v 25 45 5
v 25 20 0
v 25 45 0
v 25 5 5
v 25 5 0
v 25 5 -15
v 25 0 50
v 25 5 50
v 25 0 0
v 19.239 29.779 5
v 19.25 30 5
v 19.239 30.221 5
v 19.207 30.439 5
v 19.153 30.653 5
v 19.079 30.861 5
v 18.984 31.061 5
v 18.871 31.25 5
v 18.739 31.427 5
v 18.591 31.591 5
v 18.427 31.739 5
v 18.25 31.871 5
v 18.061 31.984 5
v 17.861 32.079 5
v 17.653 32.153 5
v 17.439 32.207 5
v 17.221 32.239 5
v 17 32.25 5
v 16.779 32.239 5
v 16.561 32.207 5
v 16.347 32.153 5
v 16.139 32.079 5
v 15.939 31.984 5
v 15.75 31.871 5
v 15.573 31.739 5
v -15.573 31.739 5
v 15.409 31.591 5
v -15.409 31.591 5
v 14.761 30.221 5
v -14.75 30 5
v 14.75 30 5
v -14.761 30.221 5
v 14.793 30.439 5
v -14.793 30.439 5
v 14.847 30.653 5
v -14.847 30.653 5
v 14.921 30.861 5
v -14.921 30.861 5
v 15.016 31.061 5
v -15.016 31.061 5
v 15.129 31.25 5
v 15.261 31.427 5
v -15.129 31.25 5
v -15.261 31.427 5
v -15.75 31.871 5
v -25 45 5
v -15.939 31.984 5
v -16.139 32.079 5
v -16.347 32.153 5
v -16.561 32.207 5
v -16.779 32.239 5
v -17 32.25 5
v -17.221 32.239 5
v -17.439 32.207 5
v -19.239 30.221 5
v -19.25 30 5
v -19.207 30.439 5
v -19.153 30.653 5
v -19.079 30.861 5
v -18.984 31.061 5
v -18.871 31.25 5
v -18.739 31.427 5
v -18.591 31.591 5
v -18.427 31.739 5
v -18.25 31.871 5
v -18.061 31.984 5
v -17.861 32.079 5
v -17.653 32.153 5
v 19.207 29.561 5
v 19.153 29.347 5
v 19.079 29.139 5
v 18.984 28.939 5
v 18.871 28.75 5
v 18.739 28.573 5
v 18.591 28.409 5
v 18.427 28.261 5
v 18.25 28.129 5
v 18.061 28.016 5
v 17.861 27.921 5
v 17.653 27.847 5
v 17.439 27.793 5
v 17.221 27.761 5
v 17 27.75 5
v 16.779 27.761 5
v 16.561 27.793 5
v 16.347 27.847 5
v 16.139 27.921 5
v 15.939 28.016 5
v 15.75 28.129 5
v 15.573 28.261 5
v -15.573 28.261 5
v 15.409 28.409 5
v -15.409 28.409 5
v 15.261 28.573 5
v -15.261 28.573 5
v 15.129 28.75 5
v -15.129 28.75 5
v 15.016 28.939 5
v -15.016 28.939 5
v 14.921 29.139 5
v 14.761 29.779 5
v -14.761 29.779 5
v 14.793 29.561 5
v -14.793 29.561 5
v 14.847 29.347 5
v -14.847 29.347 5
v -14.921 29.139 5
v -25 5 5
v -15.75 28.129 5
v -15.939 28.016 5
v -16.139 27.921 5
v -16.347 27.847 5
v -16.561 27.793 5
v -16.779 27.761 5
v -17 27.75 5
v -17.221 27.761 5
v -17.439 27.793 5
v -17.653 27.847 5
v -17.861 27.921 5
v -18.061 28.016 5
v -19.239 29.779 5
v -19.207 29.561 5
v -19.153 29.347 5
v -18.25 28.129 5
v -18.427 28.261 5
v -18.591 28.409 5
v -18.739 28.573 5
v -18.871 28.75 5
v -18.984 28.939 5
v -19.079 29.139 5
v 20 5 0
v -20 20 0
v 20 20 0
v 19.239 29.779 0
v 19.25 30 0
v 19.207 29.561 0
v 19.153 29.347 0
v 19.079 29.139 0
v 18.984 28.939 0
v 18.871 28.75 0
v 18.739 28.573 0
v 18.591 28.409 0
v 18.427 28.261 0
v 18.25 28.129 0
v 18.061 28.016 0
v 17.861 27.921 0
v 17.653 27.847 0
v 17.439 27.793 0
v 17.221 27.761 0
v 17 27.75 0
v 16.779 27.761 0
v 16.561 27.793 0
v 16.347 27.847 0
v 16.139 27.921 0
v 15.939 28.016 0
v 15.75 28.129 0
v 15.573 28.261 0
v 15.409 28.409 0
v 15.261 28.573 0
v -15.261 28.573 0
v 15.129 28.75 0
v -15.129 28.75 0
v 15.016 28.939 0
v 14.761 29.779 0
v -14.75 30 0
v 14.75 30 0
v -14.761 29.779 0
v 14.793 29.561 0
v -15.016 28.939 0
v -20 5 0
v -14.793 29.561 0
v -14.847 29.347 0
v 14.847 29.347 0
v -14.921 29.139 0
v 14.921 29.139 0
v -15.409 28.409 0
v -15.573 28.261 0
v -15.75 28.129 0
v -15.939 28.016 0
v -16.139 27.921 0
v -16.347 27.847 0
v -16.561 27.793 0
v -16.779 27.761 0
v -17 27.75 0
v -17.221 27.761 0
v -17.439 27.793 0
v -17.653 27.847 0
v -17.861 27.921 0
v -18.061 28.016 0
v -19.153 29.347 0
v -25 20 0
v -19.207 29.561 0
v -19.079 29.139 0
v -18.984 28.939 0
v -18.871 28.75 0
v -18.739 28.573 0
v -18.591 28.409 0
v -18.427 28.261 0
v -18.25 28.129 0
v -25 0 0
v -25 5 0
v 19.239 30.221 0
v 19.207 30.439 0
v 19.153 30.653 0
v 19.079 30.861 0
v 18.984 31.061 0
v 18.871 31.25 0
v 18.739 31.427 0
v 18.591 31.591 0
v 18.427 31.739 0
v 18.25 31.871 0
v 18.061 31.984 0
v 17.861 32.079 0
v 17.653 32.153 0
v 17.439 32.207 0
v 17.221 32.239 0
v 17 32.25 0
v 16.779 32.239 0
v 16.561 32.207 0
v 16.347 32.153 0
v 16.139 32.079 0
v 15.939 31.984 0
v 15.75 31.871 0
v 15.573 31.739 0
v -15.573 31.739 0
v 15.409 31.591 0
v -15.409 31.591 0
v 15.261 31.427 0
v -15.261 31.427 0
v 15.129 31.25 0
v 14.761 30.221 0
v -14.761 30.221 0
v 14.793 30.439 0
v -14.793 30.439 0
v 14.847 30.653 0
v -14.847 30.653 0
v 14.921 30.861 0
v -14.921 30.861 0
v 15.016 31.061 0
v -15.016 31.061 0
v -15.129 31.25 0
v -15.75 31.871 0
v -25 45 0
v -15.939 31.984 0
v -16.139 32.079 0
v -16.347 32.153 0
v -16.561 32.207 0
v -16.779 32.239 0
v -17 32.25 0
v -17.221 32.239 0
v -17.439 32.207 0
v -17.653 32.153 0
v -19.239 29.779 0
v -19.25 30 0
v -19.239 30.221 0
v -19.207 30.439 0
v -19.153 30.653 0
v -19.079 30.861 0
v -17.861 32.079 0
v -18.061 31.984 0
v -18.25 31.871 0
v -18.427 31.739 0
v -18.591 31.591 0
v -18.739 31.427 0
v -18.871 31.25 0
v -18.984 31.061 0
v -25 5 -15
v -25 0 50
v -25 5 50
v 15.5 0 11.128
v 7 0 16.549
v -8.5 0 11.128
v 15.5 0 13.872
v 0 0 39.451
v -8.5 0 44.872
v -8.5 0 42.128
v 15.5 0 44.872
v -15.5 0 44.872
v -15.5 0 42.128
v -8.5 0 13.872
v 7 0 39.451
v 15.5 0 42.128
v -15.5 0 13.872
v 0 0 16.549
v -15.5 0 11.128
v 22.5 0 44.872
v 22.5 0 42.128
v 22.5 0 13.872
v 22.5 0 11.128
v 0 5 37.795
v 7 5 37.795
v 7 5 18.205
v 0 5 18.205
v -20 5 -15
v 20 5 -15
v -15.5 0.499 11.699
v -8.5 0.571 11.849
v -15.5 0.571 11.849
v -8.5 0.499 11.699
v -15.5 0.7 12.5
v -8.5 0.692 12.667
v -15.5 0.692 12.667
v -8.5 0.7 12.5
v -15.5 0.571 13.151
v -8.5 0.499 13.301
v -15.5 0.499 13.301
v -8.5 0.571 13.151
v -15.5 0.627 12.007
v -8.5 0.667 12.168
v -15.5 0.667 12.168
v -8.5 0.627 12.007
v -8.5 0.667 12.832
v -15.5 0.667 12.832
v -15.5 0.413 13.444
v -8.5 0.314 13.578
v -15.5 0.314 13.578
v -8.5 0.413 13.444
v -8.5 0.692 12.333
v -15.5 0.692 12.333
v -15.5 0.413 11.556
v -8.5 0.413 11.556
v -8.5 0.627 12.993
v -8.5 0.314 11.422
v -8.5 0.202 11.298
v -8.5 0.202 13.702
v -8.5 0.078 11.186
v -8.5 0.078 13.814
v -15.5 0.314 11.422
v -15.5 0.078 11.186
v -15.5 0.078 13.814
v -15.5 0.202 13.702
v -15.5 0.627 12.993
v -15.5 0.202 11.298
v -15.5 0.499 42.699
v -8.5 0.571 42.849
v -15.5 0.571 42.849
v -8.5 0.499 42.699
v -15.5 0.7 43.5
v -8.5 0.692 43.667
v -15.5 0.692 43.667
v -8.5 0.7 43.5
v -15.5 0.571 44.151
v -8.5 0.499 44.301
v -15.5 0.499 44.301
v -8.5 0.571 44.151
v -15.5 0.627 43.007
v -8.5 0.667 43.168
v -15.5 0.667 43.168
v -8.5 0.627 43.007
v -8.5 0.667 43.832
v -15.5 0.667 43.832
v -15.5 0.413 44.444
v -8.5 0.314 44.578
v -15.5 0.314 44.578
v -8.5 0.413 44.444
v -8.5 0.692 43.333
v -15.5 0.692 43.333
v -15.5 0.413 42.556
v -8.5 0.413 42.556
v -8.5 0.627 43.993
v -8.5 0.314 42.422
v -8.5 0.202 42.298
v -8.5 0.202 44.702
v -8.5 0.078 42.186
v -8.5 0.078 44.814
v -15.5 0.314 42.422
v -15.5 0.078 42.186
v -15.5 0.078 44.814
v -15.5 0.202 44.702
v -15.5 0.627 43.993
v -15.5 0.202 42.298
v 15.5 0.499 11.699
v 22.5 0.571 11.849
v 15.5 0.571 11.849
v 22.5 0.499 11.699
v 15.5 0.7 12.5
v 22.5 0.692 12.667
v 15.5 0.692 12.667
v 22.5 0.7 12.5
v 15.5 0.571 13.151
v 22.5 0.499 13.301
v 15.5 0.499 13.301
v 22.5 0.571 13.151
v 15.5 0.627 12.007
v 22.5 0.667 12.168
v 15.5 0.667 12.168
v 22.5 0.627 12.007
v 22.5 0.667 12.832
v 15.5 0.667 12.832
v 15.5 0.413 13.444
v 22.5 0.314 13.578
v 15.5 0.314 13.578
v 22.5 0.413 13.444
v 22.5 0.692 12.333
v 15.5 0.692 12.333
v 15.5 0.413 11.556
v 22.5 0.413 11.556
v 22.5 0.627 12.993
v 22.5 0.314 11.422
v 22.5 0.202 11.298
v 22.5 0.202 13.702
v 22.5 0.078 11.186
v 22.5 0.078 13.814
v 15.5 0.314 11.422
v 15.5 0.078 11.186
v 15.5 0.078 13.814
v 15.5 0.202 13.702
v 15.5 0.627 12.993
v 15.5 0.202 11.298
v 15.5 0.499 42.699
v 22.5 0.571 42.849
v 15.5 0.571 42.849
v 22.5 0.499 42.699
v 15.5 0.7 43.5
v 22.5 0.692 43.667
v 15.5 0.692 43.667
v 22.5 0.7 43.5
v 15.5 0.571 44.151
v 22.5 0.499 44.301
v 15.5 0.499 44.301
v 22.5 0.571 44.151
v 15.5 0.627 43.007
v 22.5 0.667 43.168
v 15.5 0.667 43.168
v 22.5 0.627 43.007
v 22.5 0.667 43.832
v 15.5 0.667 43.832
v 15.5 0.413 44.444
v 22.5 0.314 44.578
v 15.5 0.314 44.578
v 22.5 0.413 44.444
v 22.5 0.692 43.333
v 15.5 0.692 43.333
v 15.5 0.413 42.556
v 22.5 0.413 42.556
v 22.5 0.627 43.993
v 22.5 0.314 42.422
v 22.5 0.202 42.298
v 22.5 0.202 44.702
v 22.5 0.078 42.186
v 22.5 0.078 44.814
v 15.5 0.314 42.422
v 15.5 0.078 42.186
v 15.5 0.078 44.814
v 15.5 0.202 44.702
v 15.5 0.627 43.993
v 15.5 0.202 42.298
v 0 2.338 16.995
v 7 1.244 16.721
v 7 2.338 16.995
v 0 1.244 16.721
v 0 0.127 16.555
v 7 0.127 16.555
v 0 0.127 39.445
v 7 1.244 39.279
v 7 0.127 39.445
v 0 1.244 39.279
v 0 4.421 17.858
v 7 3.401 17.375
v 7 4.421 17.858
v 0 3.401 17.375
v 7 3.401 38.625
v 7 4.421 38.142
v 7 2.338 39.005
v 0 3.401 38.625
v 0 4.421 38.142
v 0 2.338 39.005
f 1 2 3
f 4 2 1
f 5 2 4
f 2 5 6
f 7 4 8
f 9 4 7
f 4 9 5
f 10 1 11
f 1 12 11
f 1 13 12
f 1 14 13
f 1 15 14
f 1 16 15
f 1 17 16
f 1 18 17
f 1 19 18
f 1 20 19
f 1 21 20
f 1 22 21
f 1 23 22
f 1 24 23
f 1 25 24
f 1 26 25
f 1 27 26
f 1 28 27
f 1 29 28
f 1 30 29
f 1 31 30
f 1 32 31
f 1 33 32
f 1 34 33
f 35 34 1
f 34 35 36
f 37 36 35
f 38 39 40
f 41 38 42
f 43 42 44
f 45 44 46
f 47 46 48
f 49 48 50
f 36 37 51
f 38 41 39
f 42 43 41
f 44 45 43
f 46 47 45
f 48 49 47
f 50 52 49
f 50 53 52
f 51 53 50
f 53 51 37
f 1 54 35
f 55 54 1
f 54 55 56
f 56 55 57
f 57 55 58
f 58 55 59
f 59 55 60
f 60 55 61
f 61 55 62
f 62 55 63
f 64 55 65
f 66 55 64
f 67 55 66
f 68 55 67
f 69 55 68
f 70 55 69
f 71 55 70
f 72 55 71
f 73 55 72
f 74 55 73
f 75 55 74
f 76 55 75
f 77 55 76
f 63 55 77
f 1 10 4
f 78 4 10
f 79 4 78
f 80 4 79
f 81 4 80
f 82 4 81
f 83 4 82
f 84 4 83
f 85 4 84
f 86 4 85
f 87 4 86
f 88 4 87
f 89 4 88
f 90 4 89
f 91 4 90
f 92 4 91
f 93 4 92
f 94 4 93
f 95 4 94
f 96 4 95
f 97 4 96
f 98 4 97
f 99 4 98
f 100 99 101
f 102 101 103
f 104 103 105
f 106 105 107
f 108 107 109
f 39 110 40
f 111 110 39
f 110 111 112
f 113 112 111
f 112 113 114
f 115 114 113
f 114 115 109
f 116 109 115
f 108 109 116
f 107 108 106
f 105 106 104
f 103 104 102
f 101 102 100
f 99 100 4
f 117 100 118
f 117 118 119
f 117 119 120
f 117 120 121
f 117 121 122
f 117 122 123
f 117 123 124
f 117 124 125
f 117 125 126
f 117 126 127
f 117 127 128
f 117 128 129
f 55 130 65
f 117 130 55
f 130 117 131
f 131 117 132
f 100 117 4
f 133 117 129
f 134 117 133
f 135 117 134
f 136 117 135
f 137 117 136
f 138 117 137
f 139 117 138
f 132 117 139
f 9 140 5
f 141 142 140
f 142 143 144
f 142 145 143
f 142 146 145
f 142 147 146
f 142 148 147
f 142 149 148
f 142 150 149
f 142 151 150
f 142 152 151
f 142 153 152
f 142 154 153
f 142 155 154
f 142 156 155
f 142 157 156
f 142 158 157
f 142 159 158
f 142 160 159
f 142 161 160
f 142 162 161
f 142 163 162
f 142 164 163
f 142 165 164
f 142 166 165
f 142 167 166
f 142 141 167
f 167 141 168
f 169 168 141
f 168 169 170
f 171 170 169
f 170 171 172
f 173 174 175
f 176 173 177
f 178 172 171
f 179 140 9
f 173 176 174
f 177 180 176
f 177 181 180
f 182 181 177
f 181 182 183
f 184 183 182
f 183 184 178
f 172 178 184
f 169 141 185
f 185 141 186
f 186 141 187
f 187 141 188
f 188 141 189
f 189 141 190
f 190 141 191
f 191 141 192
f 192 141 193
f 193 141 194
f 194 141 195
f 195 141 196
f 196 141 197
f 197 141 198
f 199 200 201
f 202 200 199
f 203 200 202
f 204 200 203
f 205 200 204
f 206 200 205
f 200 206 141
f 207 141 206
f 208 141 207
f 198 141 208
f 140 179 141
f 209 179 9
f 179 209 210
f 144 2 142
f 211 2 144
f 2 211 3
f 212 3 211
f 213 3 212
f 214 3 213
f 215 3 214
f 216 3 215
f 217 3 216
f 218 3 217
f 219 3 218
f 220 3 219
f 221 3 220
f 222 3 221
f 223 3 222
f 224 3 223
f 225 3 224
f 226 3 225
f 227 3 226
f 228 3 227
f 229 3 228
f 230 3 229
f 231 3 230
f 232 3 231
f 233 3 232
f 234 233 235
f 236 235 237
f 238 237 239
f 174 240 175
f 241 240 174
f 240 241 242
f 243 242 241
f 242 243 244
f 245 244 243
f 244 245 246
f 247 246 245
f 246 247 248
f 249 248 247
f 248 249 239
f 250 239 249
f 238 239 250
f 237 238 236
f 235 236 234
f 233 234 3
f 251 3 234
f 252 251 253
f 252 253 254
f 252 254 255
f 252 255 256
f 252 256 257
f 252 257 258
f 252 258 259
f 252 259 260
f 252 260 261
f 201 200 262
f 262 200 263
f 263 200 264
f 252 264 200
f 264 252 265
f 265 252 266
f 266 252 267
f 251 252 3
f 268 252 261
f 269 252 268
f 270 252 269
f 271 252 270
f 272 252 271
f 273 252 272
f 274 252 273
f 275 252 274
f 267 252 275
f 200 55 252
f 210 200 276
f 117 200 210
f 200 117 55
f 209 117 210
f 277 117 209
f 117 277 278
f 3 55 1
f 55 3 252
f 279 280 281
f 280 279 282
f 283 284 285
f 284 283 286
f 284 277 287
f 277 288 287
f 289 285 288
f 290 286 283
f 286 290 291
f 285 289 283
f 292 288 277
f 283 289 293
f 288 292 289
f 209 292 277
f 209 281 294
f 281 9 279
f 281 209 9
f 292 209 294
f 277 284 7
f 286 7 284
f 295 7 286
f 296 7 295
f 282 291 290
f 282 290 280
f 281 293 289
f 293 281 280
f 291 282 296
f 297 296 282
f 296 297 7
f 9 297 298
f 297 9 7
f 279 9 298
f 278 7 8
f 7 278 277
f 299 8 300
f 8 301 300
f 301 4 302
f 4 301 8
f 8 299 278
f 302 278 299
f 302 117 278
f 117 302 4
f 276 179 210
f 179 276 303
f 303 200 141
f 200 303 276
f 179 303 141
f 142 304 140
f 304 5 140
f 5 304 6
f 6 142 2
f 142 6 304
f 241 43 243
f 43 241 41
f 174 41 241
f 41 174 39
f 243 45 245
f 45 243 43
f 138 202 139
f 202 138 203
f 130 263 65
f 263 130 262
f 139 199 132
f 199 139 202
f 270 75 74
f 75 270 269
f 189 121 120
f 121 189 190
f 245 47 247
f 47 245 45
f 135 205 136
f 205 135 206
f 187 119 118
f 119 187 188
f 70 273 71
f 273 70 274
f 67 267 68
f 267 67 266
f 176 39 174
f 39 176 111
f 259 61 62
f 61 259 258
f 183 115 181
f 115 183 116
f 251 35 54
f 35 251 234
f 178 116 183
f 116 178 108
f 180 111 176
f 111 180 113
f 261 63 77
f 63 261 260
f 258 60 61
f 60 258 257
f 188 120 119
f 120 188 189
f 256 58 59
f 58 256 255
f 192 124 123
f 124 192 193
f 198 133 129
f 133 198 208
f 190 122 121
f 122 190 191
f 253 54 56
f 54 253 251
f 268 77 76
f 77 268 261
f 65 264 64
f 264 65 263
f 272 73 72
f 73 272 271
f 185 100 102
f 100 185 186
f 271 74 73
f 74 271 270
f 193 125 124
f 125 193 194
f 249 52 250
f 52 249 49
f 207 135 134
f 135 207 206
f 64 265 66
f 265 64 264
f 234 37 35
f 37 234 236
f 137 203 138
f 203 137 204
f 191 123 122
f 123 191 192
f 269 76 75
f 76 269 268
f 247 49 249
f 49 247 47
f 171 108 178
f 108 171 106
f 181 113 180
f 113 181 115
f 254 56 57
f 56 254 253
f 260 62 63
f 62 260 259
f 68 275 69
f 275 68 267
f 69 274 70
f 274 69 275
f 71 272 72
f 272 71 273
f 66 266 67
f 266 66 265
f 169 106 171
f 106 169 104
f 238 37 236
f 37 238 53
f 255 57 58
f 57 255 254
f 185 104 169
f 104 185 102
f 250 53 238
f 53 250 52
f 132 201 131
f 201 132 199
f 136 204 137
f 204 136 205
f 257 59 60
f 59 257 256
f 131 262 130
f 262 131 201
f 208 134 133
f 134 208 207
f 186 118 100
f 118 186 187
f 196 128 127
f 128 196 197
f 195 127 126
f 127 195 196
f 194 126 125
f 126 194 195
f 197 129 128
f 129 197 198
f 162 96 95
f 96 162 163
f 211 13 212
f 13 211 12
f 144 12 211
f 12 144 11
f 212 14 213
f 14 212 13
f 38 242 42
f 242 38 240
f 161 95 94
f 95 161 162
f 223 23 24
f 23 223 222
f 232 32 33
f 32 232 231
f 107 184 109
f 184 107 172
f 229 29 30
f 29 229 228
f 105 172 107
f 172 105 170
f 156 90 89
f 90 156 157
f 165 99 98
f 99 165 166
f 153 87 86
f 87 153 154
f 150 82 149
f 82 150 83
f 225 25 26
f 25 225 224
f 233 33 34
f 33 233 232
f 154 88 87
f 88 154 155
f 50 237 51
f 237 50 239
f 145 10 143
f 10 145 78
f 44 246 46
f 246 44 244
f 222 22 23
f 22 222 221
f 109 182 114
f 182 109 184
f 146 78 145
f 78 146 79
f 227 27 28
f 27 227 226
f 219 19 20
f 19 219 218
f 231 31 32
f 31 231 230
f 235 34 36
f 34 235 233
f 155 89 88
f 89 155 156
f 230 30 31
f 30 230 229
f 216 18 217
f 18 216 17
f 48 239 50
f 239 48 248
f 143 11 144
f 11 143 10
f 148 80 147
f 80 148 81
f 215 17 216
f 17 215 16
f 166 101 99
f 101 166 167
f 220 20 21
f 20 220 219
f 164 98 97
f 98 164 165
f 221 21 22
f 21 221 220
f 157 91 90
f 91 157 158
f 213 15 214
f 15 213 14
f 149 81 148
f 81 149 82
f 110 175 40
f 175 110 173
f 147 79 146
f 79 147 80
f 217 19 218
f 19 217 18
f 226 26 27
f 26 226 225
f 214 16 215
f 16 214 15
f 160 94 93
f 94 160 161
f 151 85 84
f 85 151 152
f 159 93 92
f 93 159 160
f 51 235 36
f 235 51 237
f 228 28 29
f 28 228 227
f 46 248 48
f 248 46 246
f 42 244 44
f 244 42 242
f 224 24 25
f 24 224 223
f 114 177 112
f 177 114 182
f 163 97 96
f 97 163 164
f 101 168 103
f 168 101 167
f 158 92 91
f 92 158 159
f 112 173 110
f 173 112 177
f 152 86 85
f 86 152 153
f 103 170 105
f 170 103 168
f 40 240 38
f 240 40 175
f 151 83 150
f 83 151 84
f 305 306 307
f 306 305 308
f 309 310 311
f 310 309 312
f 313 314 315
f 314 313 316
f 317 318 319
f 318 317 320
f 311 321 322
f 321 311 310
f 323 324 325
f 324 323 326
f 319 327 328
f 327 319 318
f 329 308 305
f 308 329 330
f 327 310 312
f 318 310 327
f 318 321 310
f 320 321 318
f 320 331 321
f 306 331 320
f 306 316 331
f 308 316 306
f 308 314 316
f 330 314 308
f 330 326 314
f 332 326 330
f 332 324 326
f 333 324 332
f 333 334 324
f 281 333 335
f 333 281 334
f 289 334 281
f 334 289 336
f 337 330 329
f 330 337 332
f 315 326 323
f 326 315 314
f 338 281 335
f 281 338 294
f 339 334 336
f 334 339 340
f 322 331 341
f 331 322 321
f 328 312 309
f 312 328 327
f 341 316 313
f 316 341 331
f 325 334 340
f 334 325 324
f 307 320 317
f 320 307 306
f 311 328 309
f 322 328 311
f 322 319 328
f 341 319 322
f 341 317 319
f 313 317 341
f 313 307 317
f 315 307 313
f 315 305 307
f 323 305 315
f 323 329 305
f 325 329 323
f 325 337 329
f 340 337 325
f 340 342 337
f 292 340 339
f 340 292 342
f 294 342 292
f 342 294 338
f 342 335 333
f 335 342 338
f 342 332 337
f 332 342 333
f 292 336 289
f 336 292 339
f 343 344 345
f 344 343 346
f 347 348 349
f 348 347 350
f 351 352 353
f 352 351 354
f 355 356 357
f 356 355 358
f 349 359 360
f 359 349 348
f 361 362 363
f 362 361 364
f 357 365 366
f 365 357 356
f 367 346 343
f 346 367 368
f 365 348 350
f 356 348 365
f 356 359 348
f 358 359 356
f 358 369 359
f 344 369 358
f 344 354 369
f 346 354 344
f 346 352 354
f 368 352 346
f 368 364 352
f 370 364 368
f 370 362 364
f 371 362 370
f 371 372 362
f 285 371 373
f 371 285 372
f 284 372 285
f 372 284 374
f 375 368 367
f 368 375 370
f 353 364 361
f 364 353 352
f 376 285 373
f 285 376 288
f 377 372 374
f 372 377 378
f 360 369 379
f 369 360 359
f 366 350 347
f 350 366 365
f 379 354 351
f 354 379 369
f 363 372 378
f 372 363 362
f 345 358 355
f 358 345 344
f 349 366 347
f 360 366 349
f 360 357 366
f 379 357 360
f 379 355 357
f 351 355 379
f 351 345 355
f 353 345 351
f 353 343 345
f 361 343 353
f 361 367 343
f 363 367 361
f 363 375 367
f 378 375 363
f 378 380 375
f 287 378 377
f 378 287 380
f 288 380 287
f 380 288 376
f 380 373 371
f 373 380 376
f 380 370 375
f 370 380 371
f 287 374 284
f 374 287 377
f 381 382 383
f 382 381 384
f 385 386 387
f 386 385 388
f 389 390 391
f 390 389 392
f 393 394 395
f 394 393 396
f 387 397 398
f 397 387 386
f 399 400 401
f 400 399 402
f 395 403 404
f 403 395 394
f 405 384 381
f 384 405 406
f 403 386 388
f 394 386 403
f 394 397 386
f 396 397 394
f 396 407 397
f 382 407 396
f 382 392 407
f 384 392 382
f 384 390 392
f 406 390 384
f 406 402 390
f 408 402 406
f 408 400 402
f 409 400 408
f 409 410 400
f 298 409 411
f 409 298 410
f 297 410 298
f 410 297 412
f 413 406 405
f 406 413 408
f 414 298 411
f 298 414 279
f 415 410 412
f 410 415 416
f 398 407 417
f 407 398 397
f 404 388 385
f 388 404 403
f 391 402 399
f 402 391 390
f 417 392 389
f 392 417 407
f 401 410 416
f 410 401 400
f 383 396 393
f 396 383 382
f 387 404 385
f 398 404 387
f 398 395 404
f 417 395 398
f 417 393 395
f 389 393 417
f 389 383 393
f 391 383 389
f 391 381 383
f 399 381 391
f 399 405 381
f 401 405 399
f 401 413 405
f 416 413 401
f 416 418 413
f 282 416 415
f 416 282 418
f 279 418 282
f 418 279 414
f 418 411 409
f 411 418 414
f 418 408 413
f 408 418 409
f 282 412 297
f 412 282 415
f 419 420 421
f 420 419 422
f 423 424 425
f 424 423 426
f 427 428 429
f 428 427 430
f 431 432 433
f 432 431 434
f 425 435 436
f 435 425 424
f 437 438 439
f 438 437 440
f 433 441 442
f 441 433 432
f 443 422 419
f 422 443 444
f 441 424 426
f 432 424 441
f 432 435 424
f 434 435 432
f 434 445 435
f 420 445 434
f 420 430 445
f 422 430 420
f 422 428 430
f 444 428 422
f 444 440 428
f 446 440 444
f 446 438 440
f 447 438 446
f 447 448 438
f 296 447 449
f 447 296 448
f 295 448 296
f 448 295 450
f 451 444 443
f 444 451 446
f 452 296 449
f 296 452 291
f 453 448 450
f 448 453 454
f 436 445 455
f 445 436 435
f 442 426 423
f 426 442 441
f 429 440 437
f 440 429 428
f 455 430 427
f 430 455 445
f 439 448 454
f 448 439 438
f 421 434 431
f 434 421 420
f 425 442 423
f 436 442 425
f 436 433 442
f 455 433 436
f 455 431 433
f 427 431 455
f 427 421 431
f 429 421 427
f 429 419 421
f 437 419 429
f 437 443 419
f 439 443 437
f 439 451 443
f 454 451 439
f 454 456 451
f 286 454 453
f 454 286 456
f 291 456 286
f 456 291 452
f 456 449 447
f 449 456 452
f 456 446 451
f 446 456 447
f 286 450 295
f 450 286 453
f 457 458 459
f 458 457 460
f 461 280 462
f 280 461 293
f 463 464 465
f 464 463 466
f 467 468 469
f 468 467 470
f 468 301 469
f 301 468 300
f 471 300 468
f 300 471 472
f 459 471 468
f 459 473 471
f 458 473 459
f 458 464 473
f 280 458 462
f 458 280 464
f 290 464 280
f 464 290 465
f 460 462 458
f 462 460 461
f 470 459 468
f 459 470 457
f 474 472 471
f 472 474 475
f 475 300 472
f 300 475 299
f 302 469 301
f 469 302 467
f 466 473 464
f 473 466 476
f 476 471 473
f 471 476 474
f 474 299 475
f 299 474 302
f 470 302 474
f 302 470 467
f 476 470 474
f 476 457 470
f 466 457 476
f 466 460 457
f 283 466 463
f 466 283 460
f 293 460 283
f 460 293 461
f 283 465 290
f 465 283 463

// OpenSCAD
// L-shaped NEMA 17 Stepper Motor Mounting Bracket - Corrected Final
// Designed for a syringe pump application.

// --- Dimensions ---
// Base Plate
base_x_min = -25;
base_x_max = 25;
base_y_min = 0;
base_y_max = 45;
base_z_min = 0;
base_z_max = 5;

// Base Plate Holes (M4)
m4_hole_d = 4.5;
m4_hole_x1 = -17;
m4_hole_x2 = 17;
m4_hole_y = 30;

// Vertical Motor Plate
vert_x_min = -25;
vert_x_max = 25;
vert_y_min = 0;
vert_y_max = 5;
vert_z_min = 0;
vert_z_max = 50;

// Motor Boss Hole (Centering)
boss_d = 23;
boss_x = 0;
boss_z = 28;

// M3 Screw Holes (Motor Plate)
m3_hole_d = 3.4;
m3_pattern_size = 31;

// Gussets
gusset_thick = 5;
gusset_leg_y = 20;
gusset_leg_z = 20;

$fn = 64;

// --- Main Assembly ---

difference() {
    union() {
        // 1. Base Plate
        translate([base_x_min, base_y_min, base_z_min])
            cube([base_x_max - base_x_min, base_y_max - base_y_min, base_z_max]);
        
        // 2. Vertical Motor Plate
        // Standing on the back edge of the base (y=0 to 5)
        translate([vert_x_min, vert_y_min, 0])
            cube([vert_x_max - vert_x_min, vert_y_max - vert_y_min, vert_z_max]);
            
        // 3. Gussets
        // Left Gusset: x from -25 to -20, right angle at y=5, z=5
        // The gusset is in the YZ plane. 
        // We place it at the left edge (x=-25) and it extends to x=-20.
        translate([base_x_min, 5, 5])
            rotate([0, 90, 0])
            linear_extrude(height = gusset_thick)
            polygon(points = [[0, 0], [gusset_leg_y, 0], [0, gusset_leg_z]]);
            
        // Right Gusset: x from 20 to 25, right angle at y=5, z=5
        translate([base_x_max - gusset_thick, 5, 5])
            rotate([0, 90, 0])
            linear_extrude(height = gusset_thick)
            polygon(points = [[0, 0], [gusset_leg_y, 0], [0, gusset_leg_z]]);
    }

    // --- Negative Geometry (Cuts) ---
    
    // M4 Holes in Base Plate (Vertical through-holes)
    for (hx = [m4_hole_x1, m4_hole_x2]) {
        translate([hx, m4_hole_y, -1])
            cylinder(h = base_z_max + 2, d = m4_hole_d);
    }

    // Motor Boss Hole (Through the vertical plate along Y axis)
    // Center x=0, z=28, through the plate (y=0 to 5)
    translate([boss_x, -1, boss_z])
        rotate([0, 90, 0])
        cylinder(h = vert_y_max + 2, d = boss_d);

    // M3 Screw Holes in Vertical Plate (4 holes on 31mm square pattern)
    // Centered on the boss hole (0, 28)
    for (sx = [-1, 1], sz = [-1, 1]) {
        translate([sx * (m3_pattern_size / 2), -1, boss_z + sz * (m3_pattern_size / 2)])
            rotate([0, 90, 0])
            cylinder(h = vert_y_max + 2, d = m3_hole_d);
    }
}
